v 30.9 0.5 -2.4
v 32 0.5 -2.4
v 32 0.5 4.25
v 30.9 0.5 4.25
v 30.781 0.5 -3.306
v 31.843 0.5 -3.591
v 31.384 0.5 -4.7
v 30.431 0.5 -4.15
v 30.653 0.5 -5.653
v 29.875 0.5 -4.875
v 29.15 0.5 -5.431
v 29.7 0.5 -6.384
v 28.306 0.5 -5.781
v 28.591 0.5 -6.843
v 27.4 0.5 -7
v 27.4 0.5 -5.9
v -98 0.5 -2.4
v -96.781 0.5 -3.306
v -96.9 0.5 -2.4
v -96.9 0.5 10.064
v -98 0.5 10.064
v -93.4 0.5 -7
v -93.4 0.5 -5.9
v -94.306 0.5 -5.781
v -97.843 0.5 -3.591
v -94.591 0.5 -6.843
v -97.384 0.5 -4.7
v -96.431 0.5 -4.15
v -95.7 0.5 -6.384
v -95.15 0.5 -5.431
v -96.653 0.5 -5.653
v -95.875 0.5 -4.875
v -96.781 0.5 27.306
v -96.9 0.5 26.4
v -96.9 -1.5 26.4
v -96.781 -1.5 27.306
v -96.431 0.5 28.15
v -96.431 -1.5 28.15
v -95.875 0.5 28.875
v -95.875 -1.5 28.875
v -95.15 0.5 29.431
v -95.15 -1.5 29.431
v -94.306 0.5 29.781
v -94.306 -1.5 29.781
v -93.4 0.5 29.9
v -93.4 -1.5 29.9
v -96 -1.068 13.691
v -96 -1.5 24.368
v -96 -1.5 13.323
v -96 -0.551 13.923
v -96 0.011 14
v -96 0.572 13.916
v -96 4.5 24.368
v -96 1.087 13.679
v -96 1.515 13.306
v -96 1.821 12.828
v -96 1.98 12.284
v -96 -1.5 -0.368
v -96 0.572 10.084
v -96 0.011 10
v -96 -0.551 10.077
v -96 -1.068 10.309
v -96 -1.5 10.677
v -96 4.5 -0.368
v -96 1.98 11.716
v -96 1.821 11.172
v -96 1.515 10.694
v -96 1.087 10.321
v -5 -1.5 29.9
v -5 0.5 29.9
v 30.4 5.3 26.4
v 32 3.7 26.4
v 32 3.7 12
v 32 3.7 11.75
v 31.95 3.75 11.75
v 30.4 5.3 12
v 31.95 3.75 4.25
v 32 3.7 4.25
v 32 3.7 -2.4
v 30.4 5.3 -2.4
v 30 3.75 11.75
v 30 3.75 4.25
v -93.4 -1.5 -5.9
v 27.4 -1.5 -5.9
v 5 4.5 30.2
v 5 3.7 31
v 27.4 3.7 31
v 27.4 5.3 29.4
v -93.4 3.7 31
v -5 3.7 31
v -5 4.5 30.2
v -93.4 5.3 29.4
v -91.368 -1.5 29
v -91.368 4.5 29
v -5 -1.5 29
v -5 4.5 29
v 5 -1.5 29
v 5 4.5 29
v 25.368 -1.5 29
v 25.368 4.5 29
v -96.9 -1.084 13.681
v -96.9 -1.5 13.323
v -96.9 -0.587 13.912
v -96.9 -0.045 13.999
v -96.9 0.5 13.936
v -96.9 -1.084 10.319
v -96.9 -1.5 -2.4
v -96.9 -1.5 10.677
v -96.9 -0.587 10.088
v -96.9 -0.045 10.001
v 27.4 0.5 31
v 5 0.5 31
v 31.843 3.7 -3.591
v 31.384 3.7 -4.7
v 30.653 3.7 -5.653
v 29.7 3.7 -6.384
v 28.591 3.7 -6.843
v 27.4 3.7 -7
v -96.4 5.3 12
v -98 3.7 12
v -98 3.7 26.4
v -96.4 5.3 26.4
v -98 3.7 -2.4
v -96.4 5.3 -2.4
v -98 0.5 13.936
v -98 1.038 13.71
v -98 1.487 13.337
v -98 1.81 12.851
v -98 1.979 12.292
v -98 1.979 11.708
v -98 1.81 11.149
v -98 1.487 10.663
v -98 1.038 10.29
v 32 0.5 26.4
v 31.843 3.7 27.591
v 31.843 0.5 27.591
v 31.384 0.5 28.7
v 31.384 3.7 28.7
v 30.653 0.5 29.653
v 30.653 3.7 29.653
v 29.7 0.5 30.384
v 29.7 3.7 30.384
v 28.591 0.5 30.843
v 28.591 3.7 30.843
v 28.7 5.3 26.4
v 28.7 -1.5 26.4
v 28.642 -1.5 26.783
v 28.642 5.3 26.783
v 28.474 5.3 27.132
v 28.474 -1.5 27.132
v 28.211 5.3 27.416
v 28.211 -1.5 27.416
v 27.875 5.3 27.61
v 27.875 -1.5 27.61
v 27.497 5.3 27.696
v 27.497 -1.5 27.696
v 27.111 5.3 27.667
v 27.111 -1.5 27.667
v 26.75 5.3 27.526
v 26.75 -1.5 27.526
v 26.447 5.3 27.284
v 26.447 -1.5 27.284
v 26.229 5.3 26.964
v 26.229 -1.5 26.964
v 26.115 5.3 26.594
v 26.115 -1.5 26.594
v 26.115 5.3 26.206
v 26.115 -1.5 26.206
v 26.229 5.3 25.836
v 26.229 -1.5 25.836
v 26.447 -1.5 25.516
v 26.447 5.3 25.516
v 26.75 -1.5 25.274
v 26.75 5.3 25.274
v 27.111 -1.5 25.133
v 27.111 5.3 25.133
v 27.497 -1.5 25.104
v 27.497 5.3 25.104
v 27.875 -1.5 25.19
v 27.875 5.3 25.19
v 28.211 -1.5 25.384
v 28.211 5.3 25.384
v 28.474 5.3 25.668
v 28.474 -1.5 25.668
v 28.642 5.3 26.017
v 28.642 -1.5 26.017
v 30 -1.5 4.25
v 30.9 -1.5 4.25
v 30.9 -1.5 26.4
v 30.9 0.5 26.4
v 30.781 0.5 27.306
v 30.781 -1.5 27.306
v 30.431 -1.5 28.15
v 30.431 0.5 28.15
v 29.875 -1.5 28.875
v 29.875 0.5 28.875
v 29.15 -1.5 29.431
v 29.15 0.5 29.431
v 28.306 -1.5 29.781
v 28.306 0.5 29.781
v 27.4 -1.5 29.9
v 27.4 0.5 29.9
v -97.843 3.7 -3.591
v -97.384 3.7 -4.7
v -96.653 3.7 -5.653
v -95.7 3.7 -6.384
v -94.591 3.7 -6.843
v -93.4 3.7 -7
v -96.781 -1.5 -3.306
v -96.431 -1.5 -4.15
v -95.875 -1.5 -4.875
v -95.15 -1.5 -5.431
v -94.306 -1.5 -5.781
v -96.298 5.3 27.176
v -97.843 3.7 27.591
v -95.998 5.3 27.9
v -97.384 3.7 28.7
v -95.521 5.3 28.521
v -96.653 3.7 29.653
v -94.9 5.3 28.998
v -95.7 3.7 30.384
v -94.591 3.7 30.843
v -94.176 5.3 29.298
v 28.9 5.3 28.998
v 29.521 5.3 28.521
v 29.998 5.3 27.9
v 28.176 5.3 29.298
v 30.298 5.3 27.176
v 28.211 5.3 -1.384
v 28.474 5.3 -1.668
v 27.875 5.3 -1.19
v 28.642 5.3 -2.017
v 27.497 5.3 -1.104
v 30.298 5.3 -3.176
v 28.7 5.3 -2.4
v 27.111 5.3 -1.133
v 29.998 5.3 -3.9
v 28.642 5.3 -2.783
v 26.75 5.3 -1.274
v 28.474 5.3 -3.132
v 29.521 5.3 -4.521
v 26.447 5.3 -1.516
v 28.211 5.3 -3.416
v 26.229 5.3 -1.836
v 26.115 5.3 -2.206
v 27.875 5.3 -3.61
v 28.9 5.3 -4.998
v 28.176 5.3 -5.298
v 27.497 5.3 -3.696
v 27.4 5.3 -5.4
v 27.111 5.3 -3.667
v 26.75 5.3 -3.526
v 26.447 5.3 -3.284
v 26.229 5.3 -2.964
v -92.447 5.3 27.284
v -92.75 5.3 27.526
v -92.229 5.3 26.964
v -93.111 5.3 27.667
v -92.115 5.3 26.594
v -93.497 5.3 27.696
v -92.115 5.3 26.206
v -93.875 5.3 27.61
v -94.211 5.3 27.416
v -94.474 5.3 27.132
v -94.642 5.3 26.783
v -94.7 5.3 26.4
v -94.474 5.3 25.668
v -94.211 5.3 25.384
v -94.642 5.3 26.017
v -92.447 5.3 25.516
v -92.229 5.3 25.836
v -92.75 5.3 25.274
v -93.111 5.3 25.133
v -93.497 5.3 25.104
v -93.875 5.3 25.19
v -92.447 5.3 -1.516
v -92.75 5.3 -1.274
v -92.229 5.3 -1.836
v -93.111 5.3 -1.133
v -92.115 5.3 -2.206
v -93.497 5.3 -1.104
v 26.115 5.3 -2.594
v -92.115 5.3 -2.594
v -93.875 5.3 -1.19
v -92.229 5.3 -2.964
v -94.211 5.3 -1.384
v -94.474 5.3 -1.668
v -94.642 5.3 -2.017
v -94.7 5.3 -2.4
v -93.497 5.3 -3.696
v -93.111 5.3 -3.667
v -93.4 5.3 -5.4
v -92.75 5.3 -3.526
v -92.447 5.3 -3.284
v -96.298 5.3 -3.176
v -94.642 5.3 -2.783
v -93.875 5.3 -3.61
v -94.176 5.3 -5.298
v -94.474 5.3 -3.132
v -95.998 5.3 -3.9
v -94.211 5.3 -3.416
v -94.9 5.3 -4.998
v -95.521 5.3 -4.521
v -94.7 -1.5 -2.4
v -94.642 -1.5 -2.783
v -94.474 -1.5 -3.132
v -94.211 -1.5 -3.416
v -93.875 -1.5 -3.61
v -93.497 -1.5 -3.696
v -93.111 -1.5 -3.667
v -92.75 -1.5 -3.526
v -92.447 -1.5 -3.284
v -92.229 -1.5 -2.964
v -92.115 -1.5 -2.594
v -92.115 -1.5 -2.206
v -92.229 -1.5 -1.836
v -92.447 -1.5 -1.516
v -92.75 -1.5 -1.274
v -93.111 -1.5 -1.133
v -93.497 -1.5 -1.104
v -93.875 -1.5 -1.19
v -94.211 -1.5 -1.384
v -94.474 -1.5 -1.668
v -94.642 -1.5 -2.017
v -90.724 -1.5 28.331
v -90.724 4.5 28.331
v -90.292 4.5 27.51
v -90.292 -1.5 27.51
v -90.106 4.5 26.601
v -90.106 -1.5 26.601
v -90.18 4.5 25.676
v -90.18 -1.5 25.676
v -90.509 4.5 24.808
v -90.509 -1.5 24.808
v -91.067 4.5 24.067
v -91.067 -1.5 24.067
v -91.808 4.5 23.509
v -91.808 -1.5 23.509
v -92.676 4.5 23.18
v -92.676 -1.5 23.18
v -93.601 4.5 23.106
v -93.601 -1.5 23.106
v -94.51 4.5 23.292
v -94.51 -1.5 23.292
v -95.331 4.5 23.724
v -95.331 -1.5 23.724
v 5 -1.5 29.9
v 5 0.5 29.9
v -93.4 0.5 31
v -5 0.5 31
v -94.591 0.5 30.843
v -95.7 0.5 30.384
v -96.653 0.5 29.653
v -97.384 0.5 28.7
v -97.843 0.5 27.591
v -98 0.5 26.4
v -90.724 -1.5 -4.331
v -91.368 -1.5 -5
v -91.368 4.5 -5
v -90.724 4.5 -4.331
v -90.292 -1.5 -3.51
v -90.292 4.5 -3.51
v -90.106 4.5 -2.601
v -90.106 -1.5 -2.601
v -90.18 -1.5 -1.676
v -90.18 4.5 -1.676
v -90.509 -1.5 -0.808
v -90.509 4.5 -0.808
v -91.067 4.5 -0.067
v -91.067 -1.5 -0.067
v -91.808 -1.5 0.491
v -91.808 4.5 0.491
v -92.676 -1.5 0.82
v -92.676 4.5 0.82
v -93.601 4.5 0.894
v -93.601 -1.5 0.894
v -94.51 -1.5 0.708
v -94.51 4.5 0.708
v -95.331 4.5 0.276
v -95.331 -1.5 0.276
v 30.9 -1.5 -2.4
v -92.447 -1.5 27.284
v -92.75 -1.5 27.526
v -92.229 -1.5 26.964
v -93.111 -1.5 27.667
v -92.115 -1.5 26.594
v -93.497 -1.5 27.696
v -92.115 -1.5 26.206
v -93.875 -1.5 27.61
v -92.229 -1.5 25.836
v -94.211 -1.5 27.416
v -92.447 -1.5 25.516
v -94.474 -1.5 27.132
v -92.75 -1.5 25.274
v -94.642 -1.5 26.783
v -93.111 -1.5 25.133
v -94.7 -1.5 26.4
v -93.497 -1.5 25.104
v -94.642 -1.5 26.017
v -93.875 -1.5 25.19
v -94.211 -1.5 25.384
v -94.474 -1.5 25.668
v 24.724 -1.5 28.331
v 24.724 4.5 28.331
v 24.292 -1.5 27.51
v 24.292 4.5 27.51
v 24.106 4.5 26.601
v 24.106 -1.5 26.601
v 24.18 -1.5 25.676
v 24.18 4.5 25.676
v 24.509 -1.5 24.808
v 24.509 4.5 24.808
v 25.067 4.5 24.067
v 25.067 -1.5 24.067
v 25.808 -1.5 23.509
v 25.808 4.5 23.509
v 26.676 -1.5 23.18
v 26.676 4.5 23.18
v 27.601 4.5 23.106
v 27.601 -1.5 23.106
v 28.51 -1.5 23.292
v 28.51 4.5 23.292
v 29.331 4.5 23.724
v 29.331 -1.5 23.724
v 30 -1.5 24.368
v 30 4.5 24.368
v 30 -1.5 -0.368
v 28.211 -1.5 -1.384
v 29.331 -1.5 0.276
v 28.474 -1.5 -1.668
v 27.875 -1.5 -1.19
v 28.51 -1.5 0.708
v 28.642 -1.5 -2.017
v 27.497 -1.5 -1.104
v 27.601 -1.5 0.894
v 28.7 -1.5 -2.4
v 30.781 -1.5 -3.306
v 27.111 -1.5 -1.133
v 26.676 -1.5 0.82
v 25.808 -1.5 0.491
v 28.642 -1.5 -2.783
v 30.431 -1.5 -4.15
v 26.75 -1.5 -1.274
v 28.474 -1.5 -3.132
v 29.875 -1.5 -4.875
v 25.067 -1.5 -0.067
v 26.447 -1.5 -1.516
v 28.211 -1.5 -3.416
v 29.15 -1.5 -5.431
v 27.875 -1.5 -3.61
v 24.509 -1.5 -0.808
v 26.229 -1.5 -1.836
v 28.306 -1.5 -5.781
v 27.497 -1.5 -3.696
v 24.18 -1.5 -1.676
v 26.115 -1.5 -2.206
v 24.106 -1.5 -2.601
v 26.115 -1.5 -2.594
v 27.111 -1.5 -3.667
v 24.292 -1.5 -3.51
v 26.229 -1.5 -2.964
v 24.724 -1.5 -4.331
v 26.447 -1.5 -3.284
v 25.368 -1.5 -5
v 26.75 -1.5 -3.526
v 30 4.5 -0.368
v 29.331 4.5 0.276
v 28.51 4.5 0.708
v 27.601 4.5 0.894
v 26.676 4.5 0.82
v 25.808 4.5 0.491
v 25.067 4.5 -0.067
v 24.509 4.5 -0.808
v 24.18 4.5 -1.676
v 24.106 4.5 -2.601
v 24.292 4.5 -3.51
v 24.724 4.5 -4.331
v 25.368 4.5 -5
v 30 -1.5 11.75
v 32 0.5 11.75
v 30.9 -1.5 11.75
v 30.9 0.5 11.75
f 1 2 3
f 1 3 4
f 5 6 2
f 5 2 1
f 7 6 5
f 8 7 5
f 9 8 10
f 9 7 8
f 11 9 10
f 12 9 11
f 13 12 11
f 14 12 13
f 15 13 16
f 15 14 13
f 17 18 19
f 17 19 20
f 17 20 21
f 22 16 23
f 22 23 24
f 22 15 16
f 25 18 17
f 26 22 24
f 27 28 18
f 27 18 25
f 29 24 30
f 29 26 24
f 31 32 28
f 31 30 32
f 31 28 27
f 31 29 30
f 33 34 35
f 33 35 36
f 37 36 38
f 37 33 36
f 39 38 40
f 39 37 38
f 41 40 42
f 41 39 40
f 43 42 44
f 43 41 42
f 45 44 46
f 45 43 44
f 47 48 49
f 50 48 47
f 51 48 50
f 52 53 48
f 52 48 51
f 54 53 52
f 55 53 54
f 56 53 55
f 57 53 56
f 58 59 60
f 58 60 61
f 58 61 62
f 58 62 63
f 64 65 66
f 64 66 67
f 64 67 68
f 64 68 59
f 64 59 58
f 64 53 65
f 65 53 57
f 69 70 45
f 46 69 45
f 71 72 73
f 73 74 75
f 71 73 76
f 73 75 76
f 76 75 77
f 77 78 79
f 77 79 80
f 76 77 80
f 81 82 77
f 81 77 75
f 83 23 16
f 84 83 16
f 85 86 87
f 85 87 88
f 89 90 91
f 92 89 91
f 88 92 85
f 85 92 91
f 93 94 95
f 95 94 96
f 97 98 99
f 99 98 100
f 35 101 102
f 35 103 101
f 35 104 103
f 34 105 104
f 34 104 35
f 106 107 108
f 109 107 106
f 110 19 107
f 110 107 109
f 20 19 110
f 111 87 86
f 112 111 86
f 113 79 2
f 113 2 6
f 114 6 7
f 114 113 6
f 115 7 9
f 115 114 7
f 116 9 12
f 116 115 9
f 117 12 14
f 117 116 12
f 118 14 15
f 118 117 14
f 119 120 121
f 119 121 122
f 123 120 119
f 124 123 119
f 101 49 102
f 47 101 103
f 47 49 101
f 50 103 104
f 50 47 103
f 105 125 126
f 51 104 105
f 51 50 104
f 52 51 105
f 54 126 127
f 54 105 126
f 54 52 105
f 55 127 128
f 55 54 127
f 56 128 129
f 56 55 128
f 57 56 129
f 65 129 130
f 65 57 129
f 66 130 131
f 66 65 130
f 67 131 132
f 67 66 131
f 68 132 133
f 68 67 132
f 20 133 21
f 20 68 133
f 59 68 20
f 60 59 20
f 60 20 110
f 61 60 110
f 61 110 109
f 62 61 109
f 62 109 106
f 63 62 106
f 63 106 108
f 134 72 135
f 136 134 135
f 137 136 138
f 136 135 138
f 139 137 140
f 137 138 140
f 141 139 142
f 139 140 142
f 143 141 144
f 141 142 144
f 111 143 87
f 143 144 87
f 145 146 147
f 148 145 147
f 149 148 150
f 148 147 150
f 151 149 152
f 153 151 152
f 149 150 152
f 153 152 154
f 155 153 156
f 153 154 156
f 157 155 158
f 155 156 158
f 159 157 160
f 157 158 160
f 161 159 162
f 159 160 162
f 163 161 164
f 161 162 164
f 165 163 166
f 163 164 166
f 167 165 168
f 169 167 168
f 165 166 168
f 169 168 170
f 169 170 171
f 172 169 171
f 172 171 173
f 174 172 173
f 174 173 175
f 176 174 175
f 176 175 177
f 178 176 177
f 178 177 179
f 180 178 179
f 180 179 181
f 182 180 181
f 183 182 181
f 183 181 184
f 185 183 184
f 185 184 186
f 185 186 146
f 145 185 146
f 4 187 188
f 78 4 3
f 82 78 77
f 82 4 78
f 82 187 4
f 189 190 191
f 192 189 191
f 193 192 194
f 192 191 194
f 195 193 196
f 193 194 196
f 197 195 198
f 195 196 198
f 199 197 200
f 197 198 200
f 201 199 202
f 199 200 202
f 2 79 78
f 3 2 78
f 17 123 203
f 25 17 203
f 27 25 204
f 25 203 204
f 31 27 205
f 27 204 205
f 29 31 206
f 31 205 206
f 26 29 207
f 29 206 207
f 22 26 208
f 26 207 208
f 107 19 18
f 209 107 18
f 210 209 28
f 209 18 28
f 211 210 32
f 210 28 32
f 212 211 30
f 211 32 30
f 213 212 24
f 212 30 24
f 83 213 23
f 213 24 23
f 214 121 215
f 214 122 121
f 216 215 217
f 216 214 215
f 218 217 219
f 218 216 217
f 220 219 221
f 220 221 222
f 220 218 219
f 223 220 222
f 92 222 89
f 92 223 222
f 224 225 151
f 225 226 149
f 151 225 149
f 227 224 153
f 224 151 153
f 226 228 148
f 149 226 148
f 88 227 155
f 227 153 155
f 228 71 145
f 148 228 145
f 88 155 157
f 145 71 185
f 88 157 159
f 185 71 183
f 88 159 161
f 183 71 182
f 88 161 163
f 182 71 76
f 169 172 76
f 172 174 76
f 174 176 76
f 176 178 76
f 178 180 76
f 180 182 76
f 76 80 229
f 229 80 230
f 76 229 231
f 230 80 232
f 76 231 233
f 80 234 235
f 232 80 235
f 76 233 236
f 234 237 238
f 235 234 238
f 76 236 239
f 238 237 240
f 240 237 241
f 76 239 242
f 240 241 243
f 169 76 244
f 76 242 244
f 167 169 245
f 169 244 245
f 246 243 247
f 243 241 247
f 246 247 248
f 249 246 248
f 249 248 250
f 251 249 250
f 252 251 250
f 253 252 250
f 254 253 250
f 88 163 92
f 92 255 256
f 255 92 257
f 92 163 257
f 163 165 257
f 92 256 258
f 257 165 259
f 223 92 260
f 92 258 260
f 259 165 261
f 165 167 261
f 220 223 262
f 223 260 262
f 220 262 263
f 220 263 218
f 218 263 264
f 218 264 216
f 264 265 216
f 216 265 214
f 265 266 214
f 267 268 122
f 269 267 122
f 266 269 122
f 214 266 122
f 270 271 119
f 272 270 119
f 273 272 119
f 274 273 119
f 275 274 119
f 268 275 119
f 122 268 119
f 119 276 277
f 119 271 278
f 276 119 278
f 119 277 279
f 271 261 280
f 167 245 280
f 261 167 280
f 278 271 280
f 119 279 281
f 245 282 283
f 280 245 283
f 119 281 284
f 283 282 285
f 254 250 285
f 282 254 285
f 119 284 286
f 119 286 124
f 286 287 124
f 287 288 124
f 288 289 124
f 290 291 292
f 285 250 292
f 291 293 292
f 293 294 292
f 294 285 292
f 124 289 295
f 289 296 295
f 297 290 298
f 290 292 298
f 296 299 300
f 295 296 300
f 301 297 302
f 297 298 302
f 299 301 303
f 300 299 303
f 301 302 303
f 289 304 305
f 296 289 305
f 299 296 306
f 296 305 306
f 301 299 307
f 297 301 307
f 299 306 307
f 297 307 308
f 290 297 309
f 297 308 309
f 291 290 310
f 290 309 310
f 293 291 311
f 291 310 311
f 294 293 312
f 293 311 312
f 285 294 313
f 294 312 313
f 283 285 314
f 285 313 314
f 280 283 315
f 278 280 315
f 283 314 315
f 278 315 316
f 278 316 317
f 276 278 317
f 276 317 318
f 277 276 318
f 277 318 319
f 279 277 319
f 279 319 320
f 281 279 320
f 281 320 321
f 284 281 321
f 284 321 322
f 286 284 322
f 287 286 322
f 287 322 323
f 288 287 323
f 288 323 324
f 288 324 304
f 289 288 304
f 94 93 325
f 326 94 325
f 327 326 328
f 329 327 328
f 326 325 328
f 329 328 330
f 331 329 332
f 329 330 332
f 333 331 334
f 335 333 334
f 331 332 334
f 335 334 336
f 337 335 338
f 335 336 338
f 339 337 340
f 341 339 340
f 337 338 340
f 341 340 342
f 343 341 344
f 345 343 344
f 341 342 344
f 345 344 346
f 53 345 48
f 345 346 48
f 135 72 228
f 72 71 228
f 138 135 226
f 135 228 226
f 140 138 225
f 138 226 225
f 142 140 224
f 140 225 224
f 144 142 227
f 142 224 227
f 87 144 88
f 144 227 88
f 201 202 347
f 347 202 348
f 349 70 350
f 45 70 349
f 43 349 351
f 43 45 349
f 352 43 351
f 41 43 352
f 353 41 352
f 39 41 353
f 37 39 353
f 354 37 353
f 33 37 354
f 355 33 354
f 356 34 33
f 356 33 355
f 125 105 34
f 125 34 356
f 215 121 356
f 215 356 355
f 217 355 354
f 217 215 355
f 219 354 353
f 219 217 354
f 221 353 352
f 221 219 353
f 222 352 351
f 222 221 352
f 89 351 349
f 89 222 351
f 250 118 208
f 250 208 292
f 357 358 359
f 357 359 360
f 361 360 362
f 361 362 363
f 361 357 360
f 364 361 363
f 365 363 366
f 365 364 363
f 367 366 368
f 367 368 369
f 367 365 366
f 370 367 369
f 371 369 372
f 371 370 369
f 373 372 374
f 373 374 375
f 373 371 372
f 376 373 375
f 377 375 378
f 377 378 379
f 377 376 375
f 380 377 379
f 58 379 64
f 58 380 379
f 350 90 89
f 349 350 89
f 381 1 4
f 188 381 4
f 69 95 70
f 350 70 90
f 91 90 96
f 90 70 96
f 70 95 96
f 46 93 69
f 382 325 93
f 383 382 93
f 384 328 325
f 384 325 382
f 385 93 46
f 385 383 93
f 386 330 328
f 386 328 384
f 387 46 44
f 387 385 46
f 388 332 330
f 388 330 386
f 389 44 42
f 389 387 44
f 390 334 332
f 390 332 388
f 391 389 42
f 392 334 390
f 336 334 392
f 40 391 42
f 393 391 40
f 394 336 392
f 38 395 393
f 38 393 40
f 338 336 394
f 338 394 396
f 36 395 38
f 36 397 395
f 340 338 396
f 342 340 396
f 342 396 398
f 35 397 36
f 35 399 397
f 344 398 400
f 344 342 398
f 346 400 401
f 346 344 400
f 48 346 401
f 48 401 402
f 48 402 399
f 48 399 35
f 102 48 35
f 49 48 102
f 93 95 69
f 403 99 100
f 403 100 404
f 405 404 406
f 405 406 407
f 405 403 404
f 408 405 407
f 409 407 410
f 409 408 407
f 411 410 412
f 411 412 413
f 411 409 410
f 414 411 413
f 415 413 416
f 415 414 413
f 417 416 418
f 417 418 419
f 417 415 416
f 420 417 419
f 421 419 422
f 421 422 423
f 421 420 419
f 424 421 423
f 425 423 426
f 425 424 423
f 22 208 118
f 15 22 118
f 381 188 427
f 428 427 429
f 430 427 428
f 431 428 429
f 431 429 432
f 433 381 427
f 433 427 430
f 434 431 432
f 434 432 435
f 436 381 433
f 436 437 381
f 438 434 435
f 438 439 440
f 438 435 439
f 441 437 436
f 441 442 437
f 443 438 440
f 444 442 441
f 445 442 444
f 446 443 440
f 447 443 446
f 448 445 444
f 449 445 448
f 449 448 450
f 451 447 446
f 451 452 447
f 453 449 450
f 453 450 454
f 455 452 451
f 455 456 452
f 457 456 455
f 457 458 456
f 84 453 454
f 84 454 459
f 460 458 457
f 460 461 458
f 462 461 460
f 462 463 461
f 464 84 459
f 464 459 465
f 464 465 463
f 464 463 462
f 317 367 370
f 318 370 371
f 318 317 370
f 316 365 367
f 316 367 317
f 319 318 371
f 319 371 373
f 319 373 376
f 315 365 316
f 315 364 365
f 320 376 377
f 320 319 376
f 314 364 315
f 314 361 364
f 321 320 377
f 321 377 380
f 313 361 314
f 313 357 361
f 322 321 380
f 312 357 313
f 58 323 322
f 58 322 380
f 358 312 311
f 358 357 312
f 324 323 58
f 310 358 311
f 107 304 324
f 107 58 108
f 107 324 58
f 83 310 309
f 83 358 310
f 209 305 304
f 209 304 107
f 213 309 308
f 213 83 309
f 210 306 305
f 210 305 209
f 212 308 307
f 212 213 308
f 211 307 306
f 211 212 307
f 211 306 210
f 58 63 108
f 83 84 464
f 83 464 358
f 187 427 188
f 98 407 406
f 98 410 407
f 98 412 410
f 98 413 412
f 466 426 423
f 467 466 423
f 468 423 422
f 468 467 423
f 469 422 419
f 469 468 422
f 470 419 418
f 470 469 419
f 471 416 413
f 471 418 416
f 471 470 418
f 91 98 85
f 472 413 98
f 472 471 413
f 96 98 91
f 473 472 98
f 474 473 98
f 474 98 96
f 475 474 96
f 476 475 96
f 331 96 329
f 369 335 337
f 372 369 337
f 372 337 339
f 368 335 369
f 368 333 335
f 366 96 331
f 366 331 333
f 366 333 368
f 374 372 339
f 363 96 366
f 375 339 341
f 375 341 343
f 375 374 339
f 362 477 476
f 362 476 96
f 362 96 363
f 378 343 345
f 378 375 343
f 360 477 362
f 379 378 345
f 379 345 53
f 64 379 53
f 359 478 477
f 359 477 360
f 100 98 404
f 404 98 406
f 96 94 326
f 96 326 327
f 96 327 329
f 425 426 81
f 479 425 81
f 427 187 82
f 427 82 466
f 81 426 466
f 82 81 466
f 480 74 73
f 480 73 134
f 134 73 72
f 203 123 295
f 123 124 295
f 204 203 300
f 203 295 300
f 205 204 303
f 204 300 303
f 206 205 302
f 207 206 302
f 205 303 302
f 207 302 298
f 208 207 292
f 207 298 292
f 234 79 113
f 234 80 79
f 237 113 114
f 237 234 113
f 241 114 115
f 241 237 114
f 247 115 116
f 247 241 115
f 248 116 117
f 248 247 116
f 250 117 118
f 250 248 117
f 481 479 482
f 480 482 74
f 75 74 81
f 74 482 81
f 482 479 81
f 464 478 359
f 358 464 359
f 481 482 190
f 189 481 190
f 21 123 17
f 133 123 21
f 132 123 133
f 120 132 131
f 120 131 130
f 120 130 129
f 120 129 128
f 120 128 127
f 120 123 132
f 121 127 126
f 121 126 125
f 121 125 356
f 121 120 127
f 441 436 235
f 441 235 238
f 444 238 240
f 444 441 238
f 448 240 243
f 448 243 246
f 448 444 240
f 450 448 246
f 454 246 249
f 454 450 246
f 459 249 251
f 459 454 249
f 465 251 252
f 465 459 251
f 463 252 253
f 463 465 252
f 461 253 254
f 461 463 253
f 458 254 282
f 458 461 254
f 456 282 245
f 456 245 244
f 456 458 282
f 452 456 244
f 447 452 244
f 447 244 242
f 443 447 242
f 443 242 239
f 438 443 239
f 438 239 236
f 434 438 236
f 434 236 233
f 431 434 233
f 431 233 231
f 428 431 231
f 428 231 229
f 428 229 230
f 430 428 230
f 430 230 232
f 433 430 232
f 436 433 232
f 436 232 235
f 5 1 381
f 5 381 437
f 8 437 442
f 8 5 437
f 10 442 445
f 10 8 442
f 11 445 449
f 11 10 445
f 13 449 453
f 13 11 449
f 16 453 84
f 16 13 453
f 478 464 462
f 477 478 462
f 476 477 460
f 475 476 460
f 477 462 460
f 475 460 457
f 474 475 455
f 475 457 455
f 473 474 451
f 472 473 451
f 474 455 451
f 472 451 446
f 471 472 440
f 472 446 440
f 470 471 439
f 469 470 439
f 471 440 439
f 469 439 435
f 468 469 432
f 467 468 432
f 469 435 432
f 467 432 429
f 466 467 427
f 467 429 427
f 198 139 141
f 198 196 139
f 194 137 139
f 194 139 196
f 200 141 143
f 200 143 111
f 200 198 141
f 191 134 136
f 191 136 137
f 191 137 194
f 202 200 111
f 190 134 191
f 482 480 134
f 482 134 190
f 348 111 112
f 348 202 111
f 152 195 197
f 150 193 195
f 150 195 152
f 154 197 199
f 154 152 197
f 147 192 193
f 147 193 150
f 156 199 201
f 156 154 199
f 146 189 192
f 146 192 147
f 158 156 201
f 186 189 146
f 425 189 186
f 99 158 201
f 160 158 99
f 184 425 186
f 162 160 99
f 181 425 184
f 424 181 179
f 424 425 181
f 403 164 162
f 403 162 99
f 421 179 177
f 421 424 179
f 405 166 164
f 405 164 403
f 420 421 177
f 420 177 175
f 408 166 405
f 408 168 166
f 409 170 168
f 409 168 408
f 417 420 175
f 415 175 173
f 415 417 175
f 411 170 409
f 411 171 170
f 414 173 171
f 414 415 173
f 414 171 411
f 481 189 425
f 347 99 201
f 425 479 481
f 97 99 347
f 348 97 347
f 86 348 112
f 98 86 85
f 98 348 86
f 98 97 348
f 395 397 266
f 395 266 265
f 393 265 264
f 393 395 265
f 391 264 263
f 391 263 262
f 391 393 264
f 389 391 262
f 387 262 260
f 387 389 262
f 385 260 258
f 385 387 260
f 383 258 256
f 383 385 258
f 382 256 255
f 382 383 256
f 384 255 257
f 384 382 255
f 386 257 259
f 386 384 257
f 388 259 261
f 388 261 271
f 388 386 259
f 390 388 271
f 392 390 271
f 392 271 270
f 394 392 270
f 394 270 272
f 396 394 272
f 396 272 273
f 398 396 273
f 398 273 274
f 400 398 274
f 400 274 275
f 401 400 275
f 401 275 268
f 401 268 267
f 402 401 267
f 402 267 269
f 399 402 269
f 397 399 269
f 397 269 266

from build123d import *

# Parameters (mm, degrees)
SKETCH037_W       = 7.5
SKETCH037_H       = 7.5
EXTRUDE045_DEPTH  = 10
SKETCH036_W       = 10
SKETCH036_H       = 9
EXTRUDE044_DEPTH  = 10
CYLINDER001_R     = 2
CYLINDER001_DEPTH = 10
SKETCH005_R       = 1.3
EXTRUDE003_DEPTH  = 20
EXTRUDE039_DEPTH  = 4
EXTRUDE042_DEPTH  = 0.8
EXTRUDE002_DEPTH  = 6
EXTRUDE037_DEPTH  = 2


with BuildPart() as extrude045:
    # Sketch037 → Extrude045 (new body)
    with BuildSketch(Plane.YZ.offset(35)):
        with Locations((0, 8)):
            Rectangle(SKETCH037_W, SKETCH037_H)
    extrude(amount=EXTRUDE045_DEPTH)


with BuildPart() as extrude045_1:
    # Extrude045 placement: moved
    add(extrude045.part.moved(Location((-9.5, 0, 0))))


with BuildPart() as extrude044:
    # Sketch036 → Extrude044 (new body)
    with BuildSketch(Plane.XY.offset(40)):
        Rectangle(SKETCH036_W, SKETCH036_H)
    extrude(amount=EXTRUDE044_DEPTH)


with BuildPart() as extrude044_1:
    # Extrude044 placement: moved
    add(extrude044.part.moved(Location((0, 0, -15.5))))


with BuildPart() as common_sub:
    # Cylinder001 → Cylinder001 (new body)
    with BuildSketch(Plane(origin=(-92.5, 0, 12), x_dir=(0, 0, 1), z_dir=(-1, 0, 0))):
        Circle(CYLINDER001_R)
    extrude(amount=CYLINDER001_DEPTH)

    # Fusion033: union Extrude045, Extrude044
    add(extrude045_1.part)
    add(extrude044_1.part)


with BuildPart() as sweep001:
    # Sweep001: sweep along a path in Sketch034
    with BuildLine(Plane.XZ.offset(10)) as sweep001_path:
        Line((32, 11.999174), (32, 26.4))
        ThreePointArc((32, 26.4), (30.652691, 29.652691), (27.4, 31))
        Line((27.4, 31), (-60.9, 31))
    # Sketch035 → Sweep001 (sweep)
    with BuildSketch(Plane.YZ):
        Polygon((5.3, 29.4), (3.7, 31), (3.7, 32), (6, 32), (6, 29.4), align=None)
    sweep(path=sweep001_path.line)


with BuildPart() as fusion030:
    # Sketch005 → Extrude003 (new body)
    with BuildSketch(Plane.XZ.offset(5)):
        with Locations((27.4, 26.4)):
            Circle(SKETCH005_R)
    extrude(amount=-EXTRUDE003_DEPTH)


with BuildPart() as fusion030_1:
    # Extrude003 placement: moved
    add(fusion030.part.moved(Location((0, -4, 0))))

    # Fusion030: union Sweep001
    add(sweep001.part)


with BuildPart() as top003:
    # Sketch028 → Extrude039 (new body)
    with BuildSketch(Plane.XZ.offset(10)):
        with BuildLine():
            ThreePointArc((32, 26.4), (30.652691, 29.652691), (27.4, 31))
            Line((27.4, 31), (-60.9, 31))
            Line((-60.9, 31), (-60.9, 29))
            Line((-60.9, 29), (27.4, 29))
            ThreePointArc((30, 26.4), (29.238478, 28.238478), (27.4, 29))
            Line((30, 12), (30, 26.4))
            Line((32, 12), (30, 12))
            Line((32, 26.4), (32, 12))
        make_face()
    extrude(amount=EXTRUDE039_DEPTH)


with BuildPart() as top003_1:
    # Extrude039 placement: moved
    add(top003.part.moved(Location((0, 14.5, 0))))


with BuildPart() as top002:
    # Sketch031 → Extrude042 (new body)
    with BuildSketch(Plane.XZ.offset(10)):
        with BuildLine():
            ThreePointArc((32, 26.399981), (30.652691, 29.652672), (27.4, 30.999981))
            Line((27.4, 30.999981), (-60.9, 30.999981))
            Line((-60.9, 30.999981), (-60.9, 11.999981))
            Line((-60.9, 11.999981), (32, 11.999981))
            Line((32, 26.399981), (32, 11.999981))
        make_face()
    extrude(amount=EXTRUDE042_DEPTH)


with BuildPart() as top002_1:
    # Extrude042 placement: moved
    add(top002.part.moved(Location((0, 15.3, 0))))


with BuildPart() as screw_hole_top:
    # Sketch004 → Extrude002 (new body)
    with BuildSketch(Plane.XZ.offset(10)):
        with BuildLine():
            ThreePointArc((25.36776, 29), (25.066548, 24.066548), (30, 24.36776))
            Line((30, 24.36776), (30, 26.4))
            ThreePointArc((30, 26.4), (29.238478, 28.238478), (27.4, 29))
            Line((25.36776, 29), (27.4, 29))
        make_face()
    extrude(amount=-EXTRUDE002_DEPTH)


with BuildPart() as screw_hole_top_1:
    # Extrude002 placement: moved
    add(screw_hole_top.part.moved(Location((0, 8.5, 0))))


with BuildPart() as top:
    # Sketch029 → Extrude037 (new body)
    with BuildSketch(Plane.XZ.offset(10)):
        with BuildLine():
            ThreePointArc((30.9, 26.4), (29.874874, 28.874874), (27.4, 29.9))
            Line((27.4, 29.9), (-33, 29.9))
            Line((-33, 29.9), (-33, 29))
            Line((-33, 29), (27.4, 29))
            ThreePointArc((30, 26.4), (29.238478, 28.238478), (27.4, 29))
            Line((30, 12), (30, 26.4))
            Line((30.9, 12), (30, 12))
            Line((30.9, 26.4), (30.9, 12))
        make_face()
    extrude(amount=EXTRUDE037_DEPTH)


with BuildPart() as top_1:
    # Extrude037 placement: moved
    add(top.part.moved(Location((0, 10.5, 0))))

    # Fusion028: union top003, top002, screw hole top
    add(top003_1.part)
    add(top002_1.part)
    add(screw_hole_top_1.part)

    # Cut024: cut Fusion030
    add(fusion030_1.part, mode=Mode.SUBTRACT)


with BuildPart() as part_mirroring:
    # Part__Mirroring: instance of top
    add(top_1.part.mirror(Plane(origin=(0, 0, 12), x_dir=(0, 1, 0), z_dir=(0, 0, 1))))


with BuildPart() as part_mirroring002:
    # Part__Mirroring002: instance of Part__Mirroring
    add(part_mirroring.part.mirror(Plane(origin=(-33, 1, 0), x_dir=(0, -1, 0), z_dir=(1, 0, 0))))


with BuildPart() as top007:
    # Part__Mirroring003: instance of top
    add(top_1.part.mirror(Plane(origin=(-33, 0, 0), x_dir=(0, -1, 0), z_dir=(1, 0, 0))))

    # Fusion032: union top, Part__Mirroring, Part__Mirroring002
    add(top_1.part)
    add(part_mirroring.part)
    add(part_mirroring002.part)

    # Cut025: cut common sub
    add(common_sub.part, mode=Mode.SUBTRACT)


solid = top007.part
